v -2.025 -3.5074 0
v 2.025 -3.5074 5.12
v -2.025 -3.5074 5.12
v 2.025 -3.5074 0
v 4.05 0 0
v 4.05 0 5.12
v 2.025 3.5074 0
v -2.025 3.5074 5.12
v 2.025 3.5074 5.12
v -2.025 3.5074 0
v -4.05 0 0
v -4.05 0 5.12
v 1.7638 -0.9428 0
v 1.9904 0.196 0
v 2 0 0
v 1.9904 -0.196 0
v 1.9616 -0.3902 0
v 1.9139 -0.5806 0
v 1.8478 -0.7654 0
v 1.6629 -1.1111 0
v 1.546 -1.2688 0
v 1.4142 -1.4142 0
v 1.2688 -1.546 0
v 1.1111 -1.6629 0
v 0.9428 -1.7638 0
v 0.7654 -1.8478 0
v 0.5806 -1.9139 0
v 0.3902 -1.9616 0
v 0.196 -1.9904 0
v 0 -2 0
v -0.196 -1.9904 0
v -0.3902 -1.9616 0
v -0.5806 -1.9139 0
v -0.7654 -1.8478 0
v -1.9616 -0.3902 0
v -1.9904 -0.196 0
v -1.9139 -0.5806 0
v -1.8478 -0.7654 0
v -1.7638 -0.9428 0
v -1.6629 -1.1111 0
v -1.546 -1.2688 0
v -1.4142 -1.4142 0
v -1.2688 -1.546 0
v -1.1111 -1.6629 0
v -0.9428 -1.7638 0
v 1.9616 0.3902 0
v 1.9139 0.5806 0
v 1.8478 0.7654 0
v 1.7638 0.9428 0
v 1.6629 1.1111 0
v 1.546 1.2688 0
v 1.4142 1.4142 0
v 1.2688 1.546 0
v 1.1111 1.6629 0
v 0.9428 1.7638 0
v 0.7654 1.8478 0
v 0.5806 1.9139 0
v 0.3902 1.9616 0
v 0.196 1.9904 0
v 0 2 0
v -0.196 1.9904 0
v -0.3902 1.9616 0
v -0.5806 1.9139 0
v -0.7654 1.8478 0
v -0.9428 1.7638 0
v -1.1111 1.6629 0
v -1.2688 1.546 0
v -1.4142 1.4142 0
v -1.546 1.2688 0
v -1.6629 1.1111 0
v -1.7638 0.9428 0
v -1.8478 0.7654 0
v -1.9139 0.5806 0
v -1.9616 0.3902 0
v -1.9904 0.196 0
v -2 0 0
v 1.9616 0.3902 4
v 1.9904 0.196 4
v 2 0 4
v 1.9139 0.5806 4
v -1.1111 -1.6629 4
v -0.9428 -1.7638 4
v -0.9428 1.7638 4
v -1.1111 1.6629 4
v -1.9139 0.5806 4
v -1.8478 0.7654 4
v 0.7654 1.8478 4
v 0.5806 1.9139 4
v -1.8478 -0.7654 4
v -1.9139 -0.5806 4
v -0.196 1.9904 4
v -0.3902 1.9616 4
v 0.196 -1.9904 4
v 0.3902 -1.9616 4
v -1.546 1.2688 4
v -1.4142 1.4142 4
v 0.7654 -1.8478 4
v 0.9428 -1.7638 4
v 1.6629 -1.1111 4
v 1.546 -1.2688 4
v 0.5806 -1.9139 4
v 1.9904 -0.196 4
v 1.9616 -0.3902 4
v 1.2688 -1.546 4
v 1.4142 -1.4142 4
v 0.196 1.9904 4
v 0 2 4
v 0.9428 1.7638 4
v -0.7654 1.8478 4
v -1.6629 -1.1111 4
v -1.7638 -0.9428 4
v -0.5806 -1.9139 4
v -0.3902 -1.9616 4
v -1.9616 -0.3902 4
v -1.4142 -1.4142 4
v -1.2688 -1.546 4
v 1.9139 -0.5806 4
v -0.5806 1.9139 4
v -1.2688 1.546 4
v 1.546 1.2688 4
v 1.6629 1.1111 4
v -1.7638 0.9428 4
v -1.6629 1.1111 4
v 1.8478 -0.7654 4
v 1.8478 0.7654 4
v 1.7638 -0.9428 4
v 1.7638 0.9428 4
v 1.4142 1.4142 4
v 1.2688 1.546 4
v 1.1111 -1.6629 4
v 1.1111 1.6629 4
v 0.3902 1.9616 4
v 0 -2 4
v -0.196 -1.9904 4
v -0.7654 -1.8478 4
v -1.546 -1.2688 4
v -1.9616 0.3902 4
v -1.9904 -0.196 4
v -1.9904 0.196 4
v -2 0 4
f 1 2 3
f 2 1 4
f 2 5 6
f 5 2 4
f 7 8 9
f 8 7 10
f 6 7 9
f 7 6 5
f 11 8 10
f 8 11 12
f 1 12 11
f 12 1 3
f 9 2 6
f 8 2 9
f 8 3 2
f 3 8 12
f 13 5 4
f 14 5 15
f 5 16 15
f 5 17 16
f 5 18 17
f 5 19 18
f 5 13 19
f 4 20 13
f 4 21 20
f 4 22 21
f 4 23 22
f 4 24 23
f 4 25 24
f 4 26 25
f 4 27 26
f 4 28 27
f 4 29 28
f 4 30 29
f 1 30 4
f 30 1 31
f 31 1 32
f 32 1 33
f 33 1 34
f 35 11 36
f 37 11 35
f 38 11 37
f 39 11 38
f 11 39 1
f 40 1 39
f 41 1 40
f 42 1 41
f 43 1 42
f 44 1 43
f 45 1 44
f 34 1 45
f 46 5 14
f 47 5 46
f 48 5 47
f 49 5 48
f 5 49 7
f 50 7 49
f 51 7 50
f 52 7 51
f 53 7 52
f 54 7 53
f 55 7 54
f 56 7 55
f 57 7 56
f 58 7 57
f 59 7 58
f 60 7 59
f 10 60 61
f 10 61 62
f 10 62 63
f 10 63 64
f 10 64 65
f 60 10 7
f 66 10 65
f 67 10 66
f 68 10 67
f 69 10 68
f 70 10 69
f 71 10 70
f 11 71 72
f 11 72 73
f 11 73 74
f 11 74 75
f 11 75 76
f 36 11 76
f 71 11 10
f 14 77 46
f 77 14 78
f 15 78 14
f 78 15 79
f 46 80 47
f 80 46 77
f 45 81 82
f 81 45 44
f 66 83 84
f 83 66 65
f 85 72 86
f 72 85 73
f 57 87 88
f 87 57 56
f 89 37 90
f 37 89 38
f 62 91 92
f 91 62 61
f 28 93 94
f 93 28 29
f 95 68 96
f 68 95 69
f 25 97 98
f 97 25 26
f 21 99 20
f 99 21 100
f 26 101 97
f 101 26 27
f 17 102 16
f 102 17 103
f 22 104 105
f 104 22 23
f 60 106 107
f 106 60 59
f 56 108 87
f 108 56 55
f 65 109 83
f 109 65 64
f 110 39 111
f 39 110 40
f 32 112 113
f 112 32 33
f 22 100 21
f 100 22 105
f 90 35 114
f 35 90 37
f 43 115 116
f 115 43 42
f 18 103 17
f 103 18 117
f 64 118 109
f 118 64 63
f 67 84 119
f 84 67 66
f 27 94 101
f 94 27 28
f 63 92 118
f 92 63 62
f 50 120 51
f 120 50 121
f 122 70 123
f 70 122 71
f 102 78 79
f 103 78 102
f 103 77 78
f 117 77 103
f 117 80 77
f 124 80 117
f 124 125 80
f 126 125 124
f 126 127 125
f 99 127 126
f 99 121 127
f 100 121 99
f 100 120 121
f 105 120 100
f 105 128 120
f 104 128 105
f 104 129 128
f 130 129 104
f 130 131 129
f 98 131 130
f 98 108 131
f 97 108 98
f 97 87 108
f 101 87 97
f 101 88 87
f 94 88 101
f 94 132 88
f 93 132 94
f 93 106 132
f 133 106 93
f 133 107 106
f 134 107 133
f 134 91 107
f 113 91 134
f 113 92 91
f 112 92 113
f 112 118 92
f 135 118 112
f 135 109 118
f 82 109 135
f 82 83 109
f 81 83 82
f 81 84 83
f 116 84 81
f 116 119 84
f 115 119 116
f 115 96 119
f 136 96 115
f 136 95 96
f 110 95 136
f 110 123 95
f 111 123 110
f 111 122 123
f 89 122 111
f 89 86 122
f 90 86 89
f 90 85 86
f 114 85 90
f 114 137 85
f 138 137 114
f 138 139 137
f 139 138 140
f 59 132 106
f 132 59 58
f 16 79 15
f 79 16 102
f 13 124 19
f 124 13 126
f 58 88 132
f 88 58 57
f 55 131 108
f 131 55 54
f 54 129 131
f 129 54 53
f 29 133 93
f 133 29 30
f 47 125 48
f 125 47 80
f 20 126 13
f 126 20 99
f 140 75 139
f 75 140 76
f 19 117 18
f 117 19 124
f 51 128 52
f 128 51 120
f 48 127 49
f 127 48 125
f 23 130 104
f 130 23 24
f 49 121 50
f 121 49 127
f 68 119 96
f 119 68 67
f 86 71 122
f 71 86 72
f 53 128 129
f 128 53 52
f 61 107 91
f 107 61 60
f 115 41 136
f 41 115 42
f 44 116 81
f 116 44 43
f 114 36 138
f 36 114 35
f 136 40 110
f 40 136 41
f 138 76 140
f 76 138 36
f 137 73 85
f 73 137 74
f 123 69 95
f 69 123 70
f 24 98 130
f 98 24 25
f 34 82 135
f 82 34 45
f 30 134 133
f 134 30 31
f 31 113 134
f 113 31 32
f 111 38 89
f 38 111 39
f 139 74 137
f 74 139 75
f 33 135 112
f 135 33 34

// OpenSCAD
module hex_nut() {
    difference() {
        // Hexagonal prism
        scale([8.1/2, 8.1/2, 3.2/2])
            cylinder(h=3.2, r=1, $fn=6);
        // Cylindrical hole
        translate([0, 0, -1])
            cylinder(h=5, r=2, $fn=64);
    }
}

hex_nut();
